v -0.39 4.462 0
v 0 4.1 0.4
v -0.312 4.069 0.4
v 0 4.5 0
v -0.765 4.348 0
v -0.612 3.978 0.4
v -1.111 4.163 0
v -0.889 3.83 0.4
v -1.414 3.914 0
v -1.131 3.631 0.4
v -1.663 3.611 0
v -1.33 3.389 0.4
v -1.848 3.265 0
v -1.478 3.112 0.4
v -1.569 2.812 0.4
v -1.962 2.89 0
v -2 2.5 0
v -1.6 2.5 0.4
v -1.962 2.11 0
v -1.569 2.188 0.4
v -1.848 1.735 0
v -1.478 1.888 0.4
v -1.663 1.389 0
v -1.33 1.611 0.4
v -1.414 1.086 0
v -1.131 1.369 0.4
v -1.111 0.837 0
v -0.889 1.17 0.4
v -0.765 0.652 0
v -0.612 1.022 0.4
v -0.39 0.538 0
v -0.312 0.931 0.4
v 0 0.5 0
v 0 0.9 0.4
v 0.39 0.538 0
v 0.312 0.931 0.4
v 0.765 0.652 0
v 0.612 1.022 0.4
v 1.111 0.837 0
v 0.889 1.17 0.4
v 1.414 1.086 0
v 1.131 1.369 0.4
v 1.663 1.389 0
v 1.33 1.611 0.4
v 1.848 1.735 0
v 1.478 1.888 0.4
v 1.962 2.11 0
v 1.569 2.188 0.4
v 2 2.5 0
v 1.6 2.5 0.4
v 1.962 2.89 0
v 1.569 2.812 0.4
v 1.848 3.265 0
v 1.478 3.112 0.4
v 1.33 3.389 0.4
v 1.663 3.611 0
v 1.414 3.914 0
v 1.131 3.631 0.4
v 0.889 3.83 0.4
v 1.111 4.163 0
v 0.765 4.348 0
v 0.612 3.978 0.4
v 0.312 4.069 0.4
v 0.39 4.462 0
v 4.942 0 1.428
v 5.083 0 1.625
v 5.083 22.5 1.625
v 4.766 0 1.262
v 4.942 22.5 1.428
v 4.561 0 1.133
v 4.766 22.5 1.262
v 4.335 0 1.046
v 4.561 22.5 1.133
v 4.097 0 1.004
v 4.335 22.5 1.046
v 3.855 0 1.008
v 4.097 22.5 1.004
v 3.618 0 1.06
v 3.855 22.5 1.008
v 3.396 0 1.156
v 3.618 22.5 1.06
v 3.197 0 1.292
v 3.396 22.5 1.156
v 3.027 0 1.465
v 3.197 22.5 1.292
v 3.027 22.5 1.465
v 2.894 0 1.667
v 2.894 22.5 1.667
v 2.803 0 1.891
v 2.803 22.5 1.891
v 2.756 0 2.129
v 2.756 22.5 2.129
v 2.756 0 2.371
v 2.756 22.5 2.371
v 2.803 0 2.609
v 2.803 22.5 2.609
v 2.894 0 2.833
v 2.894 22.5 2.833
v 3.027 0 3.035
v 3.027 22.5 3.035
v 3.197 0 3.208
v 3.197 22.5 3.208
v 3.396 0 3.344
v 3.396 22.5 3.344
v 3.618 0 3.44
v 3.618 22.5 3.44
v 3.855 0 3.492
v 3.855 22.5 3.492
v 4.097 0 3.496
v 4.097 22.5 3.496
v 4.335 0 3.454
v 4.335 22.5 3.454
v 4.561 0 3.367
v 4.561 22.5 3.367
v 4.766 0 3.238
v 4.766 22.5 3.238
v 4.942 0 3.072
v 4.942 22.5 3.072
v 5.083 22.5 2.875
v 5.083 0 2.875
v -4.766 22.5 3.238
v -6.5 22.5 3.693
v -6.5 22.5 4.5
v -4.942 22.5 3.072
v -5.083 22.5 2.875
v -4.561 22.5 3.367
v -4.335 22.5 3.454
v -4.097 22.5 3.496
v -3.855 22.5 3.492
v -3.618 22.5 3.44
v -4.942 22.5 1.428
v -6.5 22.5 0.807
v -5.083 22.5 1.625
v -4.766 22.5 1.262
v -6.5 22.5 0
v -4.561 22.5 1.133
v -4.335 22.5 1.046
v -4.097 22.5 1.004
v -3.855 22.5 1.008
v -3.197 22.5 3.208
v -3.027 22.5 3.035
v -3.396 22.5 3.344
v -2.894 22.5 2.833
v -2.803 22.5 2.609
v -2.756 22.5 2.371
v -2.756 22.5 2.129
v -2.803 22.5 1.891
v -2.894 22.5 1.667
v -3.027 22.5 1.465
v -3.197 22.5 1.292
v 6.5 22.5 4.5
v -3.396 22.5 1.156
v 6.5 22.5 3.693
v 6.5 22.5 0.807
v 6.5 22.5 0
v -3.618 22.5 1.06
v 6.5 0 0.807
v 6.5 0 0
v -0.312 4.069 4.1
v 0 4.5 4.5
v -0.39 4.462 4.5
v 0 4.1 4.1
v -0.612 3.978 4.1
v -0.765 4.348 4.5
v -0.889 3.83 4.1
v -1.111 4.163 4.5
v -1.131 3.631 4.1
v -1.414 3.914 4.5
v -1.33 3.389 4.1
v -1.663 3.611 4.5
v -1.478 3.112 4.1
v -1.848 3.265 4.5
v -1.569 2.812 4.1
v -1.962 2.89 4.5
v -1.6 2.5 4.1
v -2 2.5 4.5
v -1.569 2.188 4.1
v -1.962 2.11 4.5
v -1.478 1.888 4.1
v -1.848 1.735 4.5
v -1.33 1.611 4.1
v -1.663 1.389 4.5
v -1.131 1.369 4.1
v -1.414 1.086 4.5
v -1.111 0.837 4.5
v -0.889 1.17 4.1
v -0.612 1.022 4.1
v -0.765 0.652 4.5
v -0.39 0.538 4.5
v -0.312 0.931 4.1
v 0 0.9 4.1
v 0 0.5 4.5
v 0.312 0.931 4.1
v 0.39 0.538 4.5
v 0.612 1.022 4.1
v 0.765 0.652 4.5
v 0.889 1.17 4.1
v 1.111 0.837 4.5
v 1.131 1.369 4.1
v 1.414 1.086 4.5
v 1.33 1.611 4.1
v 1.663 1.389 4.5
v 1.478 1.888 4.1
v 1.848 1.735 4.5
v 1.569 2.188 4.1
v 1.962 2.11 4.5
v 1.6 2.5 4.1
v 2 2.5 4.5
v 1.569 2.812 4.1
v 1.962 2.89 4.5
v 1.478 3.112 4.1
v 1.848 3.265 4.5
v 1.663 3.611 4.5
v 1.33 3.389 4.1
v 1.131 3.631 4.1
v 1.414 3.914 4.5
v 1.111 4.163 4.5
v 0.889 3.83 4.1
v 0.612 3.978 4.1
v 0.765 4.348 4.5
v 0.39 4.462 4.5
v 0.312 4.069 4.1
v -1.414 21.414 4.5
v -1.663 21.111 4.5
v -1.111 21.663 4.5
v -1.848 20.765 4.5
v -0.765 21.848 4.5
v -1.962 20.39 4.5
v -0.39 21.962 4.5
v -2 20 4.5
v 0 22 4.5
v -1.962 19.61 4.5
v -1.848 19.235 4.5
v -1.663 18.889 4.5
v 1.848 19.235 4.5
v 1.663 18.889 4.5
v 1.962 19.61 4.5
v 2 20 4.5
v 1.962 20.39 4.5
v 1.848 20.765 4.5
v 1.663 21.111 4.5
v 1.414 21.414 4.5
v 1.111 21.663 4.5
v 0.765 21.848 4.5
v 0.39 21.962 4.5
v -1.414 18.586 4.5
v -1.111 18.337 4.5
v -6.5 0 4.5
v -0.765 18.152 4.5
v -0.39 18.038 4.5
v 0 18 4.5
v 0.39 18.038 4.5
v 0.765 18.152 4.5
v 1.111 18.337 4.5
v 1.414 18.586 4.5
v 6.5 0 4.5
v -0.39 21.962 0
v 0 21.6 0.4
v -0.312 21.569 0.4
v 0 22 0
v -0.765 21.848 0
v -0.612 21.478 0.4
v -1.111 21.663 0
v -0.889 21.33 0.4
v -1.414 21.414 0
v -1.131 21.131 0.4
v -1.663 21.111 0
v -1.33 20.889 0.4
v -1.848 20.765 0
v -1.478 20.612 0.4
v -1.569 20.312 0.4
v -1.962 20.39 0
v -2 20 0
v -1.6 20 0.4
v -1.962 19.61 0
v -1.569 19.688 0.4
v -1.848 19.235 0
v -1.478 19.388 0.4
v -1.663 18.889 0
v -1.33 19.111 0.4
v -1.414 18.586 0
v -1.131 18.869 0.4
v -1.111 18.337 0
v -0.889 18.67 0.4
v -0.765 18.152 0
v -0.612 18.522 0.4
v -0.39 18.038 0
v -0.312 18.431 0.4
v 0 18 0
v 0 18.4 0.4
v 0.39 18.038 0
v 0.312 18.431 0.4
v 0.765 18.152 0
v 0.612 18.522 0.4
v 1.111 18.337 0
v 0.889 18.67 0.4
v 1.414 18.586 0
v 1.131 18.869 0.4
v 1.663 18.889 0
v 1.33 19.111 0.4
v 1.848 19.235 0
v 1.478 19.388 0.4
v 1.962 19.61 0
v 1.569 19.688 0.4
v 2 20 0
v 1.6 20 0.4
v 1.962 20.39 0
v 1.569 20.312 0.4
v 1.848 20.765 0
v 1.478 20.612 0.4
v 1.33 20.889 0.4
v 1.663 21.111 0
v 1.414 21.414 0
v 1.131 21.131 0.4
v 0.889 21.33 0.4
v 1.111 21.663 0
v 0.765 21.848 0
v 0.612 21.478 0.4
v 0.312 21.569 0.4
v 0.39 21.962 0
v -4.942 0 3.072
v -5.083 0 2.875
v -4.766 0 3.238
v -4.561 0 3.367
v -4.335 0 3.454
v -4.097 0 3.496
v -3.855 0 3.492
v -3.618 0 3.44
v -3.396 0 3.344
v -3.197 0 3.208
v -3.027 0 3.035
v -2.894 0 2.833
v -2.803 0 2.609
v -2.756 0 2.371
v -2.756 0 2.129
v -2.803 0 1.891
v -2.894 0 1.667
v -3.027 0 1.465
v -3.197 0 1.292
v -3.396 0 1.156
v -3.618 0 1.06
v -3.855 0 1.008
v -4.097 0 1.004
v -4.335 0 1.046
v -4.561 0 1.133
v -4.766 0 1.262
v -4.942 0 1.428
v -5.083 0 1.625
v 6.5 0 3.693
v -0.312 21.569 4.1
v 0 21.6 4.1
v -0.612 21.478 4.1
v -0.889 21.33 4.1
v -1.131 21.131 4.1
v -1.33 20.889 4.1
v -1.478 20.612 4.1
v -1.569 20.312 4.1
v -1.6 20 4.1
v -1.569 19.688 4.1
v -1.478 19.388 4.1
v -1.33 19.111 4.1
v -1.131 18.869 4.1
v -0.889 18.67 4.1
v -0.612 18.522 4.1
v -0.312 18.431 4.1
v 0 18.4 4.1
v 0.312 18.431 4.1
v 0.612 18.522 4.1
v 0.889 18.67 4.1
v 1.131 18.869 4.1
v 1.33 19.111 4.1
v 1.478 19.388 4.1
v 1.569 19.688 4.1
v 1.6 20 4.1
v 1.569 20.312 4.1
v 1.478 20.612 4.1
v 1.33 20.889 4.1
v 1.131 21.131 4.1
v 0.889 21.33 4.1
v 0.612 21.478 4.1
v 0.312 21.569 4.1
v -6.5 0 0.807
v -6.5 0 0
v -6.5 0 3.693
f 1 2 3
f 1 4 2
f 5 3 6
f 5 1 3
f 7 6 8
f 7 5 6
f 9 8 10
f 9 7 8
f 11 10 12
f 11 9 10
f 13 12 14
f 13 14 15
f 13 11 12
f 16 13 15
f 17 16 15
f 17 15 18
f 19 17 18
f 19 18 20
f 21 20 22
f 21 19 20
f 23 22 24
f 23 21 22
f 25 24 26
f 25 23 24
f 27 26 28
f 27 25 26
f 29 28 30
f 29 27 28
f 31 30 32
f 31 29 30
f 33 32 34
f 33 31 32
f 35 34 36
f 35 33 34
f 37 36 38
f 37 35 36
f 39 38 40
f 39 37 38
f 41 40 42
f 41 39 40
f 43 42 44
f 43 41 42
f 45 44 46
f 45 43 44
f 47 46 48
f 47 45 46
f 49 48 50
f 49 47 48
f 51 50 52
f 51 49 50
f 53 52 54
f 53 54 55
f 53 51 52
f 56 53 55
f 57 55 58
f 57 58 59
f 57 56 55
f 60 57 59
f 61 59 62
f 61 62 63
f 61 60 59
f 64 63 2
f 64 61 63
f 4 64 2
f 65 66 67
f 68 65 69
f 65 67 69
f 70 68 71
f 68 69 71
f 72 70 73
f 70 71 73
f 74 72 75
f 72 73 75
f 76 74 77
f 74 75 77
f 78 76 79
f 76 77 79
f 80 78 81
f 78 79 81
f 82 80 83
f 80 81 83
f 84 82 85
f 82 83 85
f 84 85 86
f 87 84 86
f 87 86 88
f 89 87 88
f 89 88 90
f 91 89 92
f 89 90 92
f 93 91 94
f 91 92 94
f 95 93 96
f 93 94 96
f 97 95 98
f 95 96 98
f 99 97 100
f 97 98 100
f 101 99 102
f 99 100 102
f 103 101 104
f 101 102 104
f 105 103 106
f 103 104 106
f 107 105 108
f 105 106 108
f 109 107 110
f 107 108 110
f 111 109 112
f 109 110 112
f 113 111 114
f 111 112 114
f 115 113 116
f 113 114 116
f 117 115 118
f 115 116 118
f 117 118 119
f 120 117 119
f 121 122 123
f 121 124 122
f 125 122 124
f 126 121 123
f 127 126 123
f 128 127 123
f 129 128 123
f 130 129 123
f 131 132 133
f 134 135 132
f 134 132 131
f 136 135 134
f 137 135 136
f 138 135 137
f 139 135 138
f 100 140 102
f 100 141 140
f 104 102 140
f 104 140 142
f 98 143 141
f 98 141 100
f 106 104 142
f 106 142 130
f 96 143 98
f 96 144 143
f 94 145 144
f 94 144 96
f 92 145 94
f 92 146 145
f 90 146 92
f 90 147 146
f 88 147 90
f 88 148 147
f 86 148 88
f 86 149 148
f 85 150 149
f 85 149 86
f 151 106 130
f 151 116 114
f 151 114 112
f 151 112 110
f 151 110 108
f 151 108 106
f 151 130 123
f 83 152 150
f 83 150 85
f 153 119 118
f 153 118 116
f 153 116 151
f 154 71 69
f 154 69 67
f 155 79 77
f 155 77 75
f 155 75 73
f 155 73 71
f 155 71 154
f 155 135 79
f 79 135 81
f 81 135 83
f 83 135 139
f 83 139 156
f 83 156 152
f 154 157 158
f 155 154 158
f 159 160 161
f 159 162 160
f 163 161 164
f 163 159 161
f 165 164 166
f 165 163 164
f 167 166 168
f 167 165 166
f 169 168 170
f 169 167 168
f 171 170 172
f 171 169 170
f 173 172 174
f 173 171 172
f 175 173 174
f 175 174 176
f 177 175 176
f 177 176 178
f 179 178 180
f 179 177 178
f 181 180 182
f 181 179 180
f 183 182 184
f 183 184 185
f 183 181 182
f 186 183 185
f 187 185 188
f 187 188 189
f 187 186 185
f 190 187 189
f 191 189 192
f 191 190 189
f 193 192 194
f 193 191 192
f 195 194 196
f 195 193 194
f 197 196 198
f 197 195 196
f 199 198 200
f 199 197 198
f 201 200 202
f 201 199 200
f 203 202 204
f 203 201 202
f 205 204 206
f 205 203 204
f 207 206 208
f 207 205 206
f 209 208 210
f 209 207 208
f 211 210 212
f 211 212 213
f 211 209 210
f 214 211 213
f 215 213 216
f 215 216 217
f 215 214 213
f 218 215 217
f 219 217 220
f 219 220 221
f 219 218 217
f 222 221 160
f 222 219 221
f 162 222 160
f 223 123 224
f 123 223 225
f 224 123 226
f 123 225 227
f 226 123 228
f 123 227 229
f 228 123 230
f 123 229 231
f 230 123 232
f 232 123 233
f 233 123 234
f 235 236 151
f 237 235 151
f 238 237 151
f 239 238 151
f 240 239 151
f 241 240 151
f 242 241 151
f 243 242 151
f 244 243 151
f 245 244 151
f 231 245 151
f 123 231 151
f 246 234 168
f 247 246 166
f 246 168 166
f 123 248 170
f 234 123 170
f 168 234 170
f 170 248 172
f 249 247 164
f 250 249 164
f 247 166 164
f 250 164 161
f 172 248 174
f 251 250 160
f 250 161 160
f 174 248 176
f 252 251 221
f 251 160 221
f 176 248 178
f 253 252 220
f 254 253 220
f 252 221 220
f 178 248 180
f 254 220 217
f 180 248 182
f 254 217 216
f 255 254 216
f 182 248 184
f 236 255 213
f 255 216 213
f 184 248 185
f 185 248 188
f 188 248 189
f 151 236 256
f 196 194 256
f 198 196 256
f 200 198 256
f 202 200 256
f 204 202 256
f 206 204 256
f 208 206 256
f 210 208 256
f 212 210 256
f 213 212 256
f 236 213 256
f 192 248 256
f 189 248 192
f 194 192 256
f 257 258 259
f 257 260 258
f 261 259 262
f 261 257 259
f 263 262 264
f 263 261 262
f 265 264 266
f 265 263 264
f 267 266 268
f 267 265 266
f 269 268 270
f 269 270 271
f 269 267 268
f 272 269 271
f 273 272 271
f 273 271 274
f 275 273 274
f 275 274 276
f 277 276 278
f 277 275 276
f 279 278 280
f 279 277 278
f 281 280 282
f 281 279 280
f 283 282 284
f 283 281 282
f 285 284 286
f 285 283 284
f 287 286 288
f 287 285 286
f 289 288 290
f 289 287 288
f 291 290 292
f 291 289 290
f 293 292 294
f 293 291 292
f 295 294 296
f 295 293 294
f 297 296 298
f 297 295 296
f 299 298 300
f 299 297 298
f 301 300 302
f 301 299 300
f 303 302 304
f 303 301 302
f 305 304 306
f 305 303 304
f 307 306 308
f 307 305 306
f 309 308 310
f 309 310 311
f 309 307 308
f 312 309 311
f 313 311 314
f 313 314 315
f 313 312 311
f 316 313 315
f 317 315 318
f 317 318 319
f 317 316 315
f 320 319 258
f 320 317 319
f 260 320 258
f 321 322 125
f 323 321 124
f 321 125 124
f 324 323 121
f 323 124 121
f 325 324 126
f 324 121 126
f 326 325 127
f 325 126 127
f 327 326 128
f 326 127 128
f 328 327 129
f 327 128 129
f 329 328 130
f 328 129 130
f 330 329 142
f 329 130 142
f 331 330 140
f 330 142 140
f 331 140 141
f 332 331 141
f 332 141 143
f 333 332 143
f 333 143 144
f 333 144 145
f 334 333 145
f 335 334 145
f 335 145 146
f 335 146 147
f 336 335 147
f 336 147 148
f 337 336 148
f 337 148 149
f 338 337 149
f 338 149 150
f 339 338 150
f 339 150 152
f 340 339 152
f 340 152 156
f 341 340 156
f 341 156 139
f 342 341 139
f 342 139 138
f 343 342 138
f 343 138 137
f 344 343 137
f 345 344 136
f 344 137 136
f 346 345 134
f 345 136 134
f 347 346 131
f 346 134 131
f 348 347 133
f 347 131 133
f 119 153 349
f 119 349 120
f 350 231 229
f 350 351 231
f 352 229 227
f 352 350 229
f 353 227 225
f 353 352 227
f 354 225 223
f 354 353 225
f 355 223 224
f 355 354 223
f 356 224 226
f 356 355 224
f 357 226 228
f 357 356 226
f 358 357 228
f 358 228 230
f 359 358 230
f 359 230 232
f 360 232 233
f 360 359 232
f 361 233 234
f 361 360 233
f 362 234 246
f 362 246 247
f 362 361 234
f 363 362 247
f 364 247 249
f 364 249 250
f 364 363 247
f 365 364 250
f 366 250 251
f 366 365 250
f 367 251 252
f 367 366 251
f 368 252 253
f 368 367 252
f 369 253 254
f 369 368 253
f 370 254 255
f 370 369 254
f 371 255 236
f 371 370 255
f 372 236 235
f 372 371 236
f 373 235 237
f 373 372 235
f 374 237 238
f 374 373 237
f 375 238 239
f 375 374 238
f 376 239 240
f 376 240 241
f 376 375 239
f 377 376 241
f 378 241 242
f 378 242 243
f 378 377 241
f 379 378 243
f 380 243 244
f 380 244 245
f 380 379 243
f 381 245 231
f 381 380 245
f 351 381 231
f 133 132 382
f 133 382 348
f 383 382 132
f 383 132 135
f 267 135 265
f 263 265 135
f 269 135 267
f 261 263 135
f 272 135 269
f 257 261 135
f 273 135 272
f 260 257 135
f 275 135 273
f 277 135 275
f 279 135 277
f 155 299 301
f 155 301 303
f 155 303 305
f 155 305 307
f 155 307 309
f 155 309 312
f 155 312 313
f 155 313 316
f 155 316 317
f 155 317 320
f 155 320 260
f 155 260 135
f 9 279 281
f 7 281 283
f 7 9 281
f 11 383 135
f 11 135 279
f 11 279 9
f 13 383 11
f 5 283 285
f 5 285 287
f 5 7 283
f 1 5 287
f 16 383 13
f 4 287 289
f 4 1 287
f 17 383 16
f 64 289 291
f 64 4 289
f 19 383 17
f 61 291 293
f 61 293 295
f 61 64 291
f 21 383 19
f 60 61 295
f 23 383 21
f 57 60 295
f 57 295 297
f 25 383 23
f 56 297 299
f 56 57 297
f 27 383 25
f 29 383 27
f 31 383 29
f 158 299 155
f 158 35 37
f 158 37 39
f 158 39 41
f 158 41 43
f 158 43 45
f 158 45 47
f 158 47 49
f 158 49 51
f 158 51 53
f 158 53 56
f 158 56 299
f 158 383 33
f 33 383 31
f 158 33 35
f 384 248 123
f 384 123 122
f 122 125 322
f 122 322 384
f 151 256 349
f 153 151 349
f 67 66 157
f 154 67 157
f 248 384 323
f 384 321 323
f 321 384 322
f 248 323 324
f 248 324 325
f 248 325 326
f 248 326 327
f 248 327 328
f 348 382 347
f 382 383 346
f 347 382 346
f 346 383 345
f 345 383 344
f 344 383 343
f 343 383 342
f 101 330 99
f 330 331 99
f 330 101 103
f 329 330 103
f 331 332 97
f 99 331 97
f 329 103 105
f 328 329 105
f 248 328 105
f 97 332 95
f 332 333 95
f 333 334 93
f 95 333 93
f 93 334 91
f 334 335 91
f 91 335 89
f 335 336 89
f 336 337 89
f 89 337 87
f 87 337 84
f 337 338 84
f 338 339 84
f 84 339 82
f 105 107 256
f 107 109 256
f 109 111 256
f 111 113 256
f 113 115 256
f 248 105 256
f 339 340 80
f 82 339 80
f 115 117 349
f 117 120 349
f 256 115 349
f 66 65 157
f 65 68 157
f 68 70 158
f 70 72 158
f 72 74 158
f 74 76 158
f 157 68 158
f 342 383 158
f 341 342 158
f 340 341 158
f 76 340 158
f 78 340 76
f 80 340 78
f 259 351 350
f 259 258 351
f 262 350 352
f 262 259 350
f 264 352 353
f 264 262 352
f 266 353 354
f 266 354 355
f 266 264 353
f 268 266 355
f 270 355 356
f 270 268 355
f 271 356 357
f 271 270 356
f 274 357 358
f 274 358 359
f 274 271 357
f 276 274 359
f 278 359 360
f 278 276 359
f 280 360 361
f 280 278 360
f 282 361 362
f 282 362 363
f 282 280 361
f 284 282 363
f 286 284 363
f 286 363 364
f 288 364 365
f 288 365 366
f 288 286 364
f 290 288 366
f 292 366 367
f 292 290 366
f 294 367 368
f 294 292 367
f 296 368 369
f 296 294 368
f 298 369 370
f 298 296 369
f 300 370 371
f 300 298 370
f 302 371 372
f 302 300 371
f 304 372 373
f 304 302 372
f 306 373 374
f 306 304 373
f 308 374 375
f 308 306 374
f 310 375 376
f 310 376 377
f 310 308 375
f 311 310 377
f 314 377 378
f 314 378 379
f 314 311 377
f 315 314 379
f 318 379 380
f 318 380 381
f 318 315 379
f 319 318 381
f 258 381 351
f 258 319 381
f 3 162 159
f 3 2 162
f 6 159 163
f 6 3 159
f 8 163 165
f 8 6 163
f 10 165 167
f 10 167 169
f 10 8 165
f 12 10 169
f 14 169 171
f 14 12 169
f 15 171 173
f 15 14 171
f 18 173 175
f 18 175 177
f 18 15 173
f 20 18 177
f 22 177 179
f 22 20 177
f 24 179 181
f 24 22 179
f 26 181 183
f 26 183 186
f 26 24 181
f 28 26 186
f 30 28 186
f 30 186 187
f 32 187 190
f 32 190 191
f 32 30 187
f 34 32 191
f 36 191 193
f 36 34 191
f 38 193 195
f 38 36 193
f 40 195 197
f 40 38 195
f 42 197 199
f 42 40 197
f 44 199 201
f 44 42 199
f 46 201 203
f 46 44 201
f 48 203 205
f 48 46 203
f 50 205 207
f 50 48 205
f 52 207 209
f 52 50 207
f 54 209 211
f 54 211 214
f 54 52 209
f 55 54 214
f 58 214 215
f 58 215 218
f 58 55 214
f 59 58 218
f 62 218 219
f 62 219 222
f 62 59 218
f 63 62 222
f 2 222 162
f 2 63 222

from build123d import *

# Parameters (mm, degrees)
BASE_SKETCH_W                 = 13
BASE_SKETCH_H                 = 4.5
BLOCK_SIZE_DEPTH              = 22.5
M3_CLEARANCE_HOLE1_AT_2_COUNT = 2
M3_CLEARANCE_HOLE1_AT_2_PITCH = 17.5
M3X0_5_TAPPED_HOLE1_D         = 2.5
SIDE_CUTS_DEPTH               = 23.5


with BuildPart() as part:
    # Base Sketch → Block Size (new body)
    with BuildSketch(Plane(origin=(0, 0, 0), x_dir=(1, 0, 0), z_dir=(0, 1, 0))):
        with Locations((0, -2.25)):
            Rectangle(BASE_SKETCH_W, BASE_SKETCH_H)
    extrude(amount=BLOCK_SIZE_DEPTH)

    # Sketch3 → M3 Clearance Hole1 (revolve, cut)
    with BuildSketch(Plane(origin=(0, 20, 0), x_dir=(0, 1, 0), z_dir=(1, 0, 0))):
        Polygon((0, 0), (0, 4.5), (2, 4.5), (1.6, 4.1), (1.6, 0.4), (2, 0), align=None)
    m3_clearance_hole1 = revolve(axis=Axis((0, 20, -6.35), (0, 0, 1)), mode=Mode.SUBTRACT)

    # M3 Clearance Hole1 at 2: M3 Clearance Hole1 ×2
    with Locations(*[(0, -i * M3_CLEARANCE_HOLE1_AT_2_PITCH, 0) for i in range(1, M3_CLEARANCE_HOLE1_AT_2_COUNT)]):
        add(m3_clearance_hole1, mode=Mode.SUBTRACT)

    # M3x0.5 Tapped Hole1 (through all)
    with Locations(Plane.XZ):
        with Locations((-3.999999936, 2.25), (3.999999936, 2.25)):
            Hole(M3X0_5_TAPPED_HOLE1_D / 2)

    # Sketch6 → Side Cuts (cut, through all)
    with BuildSketch(Plane(origin=(0, 0, 0), x_dir=(1, 0, 0), z_dir=(0, 1, 0))):
        Polygon((-6.5, -0.80662429), (-3.999999936, -2.25), (-6.5, -3.69337571), align=None)
        Polygon((3.999999936, -2.25), (6.5, -0.80662429), (6.5, -3.69337571), align=None)
    extrude(amount=SIDE_CUTS_DEPTH, mode=Mode.SUBTRACT)


solid = part.part
